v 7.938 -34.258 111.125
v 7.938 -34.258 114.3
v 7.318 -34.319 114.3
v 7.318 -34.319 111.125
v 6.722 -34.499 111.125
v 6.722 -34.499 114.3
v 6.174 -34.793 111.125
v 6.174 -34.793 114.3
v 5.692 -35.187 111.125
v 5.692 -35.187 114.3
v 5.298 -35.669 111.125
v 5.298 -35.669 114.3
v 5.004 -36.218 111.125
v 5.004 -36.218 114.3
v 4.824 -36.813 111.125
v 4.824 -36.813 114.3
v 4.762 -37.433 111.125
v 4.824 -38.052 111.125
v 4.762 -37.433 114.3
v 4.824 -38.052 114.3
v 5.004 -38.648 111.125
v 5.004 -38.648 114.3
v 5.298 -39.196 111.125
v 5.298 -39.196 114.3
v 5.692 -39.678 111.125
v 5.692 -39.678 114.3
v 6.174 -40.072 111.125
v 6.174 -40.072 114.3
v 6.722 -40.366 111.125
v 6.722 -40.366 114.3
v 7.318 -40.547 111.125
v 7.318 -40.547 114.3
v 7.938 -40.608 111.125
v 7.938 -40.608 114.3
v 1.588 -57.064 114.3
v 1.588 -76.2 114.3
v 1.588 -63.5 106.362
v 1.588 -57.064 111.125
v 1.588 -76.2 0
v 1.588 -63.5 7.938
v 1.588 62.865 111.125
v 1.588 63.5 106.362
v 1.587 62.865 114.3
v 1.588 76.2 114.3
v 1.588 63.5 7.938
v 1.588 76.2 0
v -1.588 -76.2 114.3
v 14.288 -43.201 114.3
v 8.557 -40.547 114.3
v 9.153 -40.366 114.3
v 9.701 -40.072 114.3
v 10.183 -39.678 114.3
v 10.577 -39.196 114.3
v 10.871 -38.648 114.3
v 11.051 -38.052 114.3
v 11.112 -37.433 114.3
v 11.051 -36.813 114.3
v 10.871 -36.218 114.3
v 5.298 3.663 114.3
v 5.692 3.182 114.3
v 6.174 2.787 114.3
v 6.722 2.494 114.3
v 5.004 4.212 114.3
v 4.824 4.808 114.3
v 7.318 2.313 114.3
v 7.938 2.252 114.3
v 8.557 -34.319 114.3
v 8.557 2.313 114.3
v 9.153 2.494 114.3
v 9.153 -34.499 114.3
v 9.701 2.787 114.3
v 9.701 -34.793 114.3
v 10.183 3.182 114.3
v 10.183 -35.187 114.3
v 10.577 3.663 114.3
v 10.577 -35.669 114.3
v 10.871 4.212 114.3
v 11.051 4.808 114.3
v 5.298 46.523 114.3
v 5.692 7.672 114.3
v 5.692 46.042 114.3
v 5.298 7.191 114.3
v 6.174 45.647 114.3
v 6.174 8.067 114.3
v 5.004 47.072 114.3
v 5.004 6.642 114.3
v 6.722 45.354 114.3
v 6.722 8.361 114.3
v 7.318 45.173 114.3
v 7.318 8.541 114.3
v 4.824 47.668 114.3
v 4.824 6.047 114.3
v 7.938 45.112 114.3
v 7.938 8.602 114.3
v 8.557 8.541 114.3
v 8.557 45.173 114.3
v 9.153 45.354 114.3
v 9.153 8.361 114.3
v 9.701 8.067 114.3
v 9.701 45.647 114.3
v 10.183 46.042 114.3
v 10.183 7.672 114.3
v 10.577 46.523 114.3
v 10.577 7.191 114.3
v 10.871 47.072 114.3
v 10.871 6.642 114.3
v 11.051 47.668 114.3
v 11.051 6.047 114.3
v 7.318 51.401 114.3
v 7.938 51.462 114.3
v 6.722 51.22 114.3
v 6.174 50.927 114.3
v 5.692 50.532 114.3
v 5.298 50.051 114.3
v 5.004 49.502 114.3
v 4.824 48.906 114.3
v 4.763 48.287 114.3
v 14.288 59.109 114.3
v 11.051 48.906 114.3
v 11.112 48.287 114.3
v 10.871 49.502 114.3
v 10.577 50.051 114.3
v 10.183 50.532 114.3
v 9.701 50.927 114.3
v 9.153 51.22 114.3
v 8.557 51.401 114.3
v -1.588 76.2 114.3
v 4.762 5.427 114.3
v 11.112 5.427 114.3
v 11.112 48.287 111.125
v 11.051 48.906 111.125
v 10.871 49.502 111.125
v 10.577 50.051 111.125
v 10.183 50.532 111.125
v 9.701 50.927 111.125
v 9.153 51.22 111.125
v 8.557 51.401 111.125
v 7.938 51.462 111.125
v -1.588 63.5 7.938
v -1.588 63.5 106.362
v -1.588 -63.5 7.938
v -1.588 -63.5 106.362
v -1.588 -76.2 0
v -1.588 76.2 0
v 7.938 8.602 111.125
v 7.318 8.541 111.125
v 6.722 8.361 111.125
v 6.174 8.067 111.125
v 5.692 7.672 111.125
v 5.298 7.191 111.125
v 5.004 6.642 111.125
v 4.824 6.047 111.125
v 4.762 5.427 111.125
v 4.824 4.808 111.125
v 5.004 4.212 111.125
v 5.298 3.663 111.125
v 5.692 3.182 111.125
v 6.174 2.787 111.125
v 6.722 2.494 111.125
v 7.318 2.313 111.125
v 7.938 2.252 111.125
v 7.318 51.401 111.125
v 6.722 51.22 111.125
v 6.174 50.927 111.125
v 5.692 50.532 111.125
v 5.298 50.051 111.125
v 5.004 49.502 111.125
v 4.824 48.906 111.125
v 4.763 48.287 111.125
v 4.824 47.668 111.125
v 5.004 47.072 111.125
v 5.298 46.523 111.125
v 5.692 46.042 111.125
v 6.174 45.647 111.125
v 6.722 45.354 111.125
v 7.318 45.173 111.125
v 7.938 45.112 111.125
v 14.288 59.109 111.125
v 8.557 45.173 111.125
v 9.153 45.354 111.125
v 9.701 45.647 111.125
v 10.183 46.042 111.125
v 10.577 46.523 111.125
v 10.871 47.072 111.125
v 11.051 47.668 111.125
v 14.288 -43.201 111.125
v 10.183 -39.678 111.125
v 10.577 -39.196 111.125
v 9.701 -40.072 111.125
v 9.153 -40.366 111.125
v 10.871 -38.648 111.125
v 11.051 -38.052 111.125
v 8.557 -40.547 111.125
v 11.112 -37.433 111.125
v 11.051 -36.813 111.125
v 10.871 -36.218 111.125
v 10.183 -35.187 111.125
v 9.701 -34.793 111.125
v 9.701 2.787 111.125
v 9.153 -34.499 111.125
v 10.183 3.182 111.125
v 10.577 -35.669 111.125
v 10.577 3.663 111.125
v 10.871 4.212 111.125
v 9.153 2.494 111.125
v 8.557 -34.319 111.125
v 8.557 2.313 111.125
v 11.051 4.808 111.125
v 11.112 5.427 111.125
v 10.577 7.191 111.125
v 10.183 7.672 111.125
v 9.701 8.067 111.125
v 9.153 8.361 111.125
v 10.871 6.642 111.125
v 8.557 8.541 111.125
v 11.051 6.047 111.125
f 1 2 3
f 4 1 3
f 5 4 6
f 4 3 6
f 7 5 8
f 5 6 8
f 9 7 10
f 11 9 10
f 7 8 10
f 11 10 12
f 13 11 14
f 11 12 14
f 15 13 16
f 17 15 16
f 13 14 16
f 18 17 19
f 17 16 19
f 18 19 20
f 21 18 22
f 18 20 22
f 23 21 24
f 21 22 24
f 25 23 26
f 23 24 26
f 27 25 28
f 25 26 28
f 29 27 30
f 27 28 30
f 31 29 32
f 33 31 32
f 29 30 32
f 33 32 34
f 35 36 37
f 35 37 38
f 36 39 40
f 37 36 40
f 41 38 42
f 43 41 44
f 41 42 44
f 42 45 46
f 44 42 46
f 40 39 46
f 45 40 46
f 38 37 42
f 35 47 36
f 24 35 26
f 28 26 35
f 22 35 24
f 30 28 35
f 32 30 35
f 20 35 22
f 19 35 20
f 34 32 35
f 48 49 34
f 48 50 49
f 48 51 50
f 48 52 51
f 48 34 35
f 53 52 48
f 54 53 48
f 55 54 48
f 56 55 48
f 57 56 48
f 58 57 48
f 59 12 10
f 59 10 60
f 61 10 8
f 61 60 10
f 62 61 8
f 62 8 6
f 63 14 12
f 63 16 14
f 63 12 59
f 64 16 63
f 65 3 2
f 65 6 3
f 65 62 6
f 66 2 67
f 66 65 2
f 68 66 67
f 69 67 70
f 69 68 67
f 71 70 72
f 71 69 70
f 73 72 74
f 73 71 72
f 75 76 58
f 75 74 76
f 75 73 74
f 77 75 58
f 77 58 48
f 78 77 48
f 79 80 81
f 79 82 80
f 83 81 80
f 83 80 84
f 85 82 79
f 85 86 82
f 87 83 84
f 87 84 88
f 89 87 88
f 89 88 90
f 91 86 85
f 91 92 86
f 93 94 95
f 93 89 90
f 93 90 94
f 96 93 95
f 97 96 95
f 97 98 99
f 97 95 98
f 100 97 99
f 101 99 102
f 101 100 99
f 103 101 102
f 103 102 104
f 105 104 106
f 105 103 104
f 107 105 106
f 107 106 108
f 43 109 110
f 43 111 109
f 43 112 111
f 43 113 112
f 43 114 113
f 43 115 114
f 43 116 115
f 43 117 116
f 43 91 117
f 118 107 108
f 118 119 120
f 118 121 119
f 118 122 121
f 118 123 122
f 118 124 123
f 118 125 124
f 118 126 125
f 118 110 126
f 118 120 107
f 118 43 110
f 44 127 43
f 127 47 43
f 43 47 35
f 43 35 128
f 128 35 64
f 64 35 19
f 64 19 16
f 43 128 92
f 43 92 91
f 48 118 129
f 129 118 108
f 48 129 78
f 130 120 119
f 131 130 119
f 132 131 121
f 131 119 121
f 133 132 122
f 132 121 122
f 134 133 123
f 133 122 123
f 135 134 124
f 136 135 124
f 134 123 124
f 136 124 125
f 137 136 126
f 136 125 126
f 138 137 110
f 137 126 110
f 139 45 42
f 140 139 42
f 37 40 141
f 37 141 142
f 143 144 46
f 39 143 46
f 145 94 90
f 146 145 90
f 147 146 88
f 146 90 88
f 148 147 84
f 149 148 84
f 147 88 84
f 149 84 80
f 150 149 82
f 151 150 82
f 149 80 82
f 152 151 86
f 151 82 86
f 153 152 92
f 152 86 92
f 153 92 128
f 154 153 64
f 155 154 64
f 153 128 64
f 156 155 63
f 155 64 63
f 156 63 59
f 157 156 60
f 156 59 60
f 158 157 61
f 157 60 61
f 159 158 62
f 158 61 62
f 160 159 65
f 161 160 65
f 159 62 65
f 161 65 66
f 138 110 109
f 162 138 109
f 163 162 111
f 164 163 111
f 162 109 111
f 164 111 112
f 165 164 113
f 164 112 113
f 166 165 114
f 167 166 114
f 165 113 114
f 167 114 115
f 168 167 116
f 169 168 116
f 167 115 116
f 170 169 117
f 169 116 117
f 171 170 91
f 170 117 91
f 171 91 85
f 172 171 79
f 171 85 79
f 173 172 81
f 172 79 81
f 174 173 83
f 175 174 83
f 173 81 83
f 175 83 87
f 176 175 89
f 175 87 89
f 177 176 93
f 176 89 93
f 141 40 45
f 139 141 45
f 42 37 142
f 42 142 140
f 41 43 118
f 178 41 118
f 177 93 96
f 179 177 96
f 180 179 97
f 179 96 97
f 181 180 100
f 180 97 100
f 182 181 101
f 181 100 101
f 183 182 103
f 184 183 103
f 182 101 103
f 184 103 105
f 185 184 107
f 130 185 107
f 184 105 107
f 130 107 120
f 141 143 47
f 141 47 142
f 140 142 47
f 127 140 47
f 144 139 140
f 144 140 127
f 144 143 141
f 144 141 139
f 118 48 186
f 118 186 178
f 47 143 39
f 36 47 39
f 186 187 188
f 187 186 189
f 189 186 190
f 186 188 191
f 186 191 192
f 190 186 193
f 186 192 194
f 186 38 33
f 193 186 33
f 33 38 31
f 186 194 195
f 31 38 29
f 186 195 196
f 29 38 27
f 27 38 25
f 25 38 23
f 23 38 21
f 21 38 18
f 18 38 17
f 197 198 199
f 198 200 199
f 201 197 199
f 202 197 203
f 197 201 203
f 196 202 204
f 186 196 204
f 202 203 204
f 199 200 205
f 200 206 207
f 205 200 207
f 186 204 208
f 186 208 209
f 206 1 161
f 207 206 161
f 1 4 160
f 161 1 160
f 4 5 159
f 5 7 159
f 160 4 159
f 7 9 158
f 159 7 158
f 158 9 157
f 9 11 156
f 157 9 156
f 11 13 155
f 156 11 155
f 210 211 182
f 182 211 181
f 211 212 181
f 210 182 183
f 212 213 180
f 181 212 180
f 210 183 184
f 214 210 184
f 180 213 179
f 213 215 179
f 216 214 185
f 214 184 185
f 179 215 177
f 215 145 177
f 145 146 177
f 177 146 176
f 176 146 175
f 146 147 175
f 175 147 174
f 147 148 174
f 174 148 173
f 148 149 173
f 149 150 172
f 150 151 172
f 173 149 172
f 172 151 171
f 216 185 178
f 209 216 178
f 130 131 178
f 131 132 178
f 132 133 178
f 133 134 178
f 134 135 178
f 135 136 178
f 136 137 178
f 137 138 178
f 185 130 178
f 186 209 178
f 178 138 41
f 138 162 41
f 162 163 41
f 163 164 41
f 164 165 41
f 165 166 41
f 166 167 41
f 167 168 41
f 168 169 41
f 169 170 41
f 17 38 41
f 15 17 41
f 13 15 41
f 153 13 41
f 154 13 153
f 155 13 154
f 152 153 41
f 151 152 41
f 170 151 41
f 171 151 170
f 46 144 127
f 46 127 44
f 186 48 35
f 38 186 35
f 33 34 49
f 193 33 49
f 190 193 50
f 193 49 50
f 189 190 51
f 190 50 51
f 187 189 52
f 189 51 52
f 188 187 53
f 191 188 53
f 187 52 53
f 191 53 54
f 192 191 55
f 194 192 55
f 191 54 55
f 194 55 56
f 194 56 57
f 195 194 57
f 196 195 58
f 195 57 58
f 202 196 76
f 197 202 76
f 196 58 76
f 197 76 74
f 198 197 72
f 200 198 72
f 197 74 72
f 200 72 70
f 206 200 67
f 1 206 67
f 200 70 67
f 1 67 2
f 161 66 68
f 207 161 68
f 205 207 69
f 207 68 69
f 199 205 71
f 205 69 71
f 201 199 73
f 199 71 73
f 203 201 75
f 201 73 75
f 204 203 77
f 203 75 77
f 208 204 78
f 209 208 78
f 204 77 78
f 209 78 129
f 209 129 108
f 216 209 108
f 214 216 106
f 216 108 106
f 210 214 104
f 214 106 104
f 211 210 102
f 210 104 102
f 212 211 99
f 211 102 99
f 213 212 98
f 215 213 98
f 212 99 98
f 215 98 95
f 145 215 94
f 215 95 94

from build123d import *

# Parameters (mm, degrees)
F0_W     = 3.175
F0_H     = 152.4
F1_DEPTH = 114.3
F2_W     = 127
F2_H     = 98.425
F3_DEPTH = 25.4
F4_W     = 119.929246
F4_H     = 3.175
F5_DEPTH = 12.7
F7_DEPTH = 25.4
F9_DEPTH = 25.4


with BuildPart() as f1:
    # F0 (on Top) → F1 (new body)
    with BuildSketch(Plane.XY):
        Rectangle(F0_W, F0_H)
    extrude(amount=F1_DEPTH)

    # F2 (on face) → F3 (cut)
    with BuildSketch(Plane.YZ.offset(1.5875)):
        with Locations((0, 57.15)):
            Rectangle(F2_W, F2_H)
    extrude(amount=-F3_DEPTH, mode=Mode.SUBTRACT)

    # F4 (on face) → F5 (join)
    with BuildSketch(Plane.YZ.offset(1.5875)):
        with Locations((2.900731, 112.7125)):
            Rectangle(F4_W, F4_H)
    extrude(amount=F5_DEPTH)

    # F6 (on face) → F7 (cut)
    with BuildSketch(Plane.XY.offset(114.3)):
        Polygon((14.2875, 62.865354), (1.5875, 62.865354), (14.2875, 59.108607), align=None)
        Polygon((14.2875, -43.201216), (1.5875, -57.063892), (14.2875, -57.063892), align=None)
    extrude(amount=-F7_DEPTH, mode=Mode.SUBTRACT)

    # F8 (on face) → F9 (cut)
    with BuildSketch(Plane.XY.offset(114.3)):
        with BuildLine():
            ThreePointArc((11.1125, 48.286981), (10.182564, 50.532045), (7.9375, 51.461981))
            Line((7.9375, 51.461981), (7.9375, 45.111981))
            ThreePointArc((7.9375, 45.111981), (10.182564, 46.041917), (11.1125, 48.286981))
        make_face()
        with BuildLine():
            ThreePointArc((11.1125, -37.432554), (10.182564, -35.18749), (7.9375, -34.257554))
            Line((7.9375, -34.257554), (7.9375, -40.607554))
            ThreePointArc((7.9375, -40.607554), (10.182564, -39.677618), (11.1125, -37.432554))
        make_face()
        with BuildLine():
            Line((7.9375, -40.607554), (7.9375, -34.257554))
            ThreePointArc((7.9375, -34.257554), (4.7625, -37.432554), (7.9375, -40.607554))
        make_face()
        with BuildLine():
            ThreePointArc((11.1125, 5.427213), (10.182564, 7.672277), (7.9375, 8.602213))
            Line((7.9375, 8.602213), (7.9375, 2.252213))
            ThreePointArc((7.9375, 2.252213), (10.182564, 3.182149), (11.1125, 5.427213))
        make_face()
        with BuildLine():
            Line((7.9375, 2.252213), (7.9375, 8.602213))
            ThreePointArc((7.9375, 8.602213), (4.7625, 5.427213), (7.9375, 2.252213))
        make_face()
        with BuildLine():
            Line((7.9375, 45.111981), (7.9375, 51.461981))
            ThreePointArc((7.9375, 51.461981), (4.7625, 48.286981), (7.9375, 45.111981))
        make_face()
    extrude(amount=-F9_DEPTH, mode=Mode.SUBTRACT)


solid = f1.part
